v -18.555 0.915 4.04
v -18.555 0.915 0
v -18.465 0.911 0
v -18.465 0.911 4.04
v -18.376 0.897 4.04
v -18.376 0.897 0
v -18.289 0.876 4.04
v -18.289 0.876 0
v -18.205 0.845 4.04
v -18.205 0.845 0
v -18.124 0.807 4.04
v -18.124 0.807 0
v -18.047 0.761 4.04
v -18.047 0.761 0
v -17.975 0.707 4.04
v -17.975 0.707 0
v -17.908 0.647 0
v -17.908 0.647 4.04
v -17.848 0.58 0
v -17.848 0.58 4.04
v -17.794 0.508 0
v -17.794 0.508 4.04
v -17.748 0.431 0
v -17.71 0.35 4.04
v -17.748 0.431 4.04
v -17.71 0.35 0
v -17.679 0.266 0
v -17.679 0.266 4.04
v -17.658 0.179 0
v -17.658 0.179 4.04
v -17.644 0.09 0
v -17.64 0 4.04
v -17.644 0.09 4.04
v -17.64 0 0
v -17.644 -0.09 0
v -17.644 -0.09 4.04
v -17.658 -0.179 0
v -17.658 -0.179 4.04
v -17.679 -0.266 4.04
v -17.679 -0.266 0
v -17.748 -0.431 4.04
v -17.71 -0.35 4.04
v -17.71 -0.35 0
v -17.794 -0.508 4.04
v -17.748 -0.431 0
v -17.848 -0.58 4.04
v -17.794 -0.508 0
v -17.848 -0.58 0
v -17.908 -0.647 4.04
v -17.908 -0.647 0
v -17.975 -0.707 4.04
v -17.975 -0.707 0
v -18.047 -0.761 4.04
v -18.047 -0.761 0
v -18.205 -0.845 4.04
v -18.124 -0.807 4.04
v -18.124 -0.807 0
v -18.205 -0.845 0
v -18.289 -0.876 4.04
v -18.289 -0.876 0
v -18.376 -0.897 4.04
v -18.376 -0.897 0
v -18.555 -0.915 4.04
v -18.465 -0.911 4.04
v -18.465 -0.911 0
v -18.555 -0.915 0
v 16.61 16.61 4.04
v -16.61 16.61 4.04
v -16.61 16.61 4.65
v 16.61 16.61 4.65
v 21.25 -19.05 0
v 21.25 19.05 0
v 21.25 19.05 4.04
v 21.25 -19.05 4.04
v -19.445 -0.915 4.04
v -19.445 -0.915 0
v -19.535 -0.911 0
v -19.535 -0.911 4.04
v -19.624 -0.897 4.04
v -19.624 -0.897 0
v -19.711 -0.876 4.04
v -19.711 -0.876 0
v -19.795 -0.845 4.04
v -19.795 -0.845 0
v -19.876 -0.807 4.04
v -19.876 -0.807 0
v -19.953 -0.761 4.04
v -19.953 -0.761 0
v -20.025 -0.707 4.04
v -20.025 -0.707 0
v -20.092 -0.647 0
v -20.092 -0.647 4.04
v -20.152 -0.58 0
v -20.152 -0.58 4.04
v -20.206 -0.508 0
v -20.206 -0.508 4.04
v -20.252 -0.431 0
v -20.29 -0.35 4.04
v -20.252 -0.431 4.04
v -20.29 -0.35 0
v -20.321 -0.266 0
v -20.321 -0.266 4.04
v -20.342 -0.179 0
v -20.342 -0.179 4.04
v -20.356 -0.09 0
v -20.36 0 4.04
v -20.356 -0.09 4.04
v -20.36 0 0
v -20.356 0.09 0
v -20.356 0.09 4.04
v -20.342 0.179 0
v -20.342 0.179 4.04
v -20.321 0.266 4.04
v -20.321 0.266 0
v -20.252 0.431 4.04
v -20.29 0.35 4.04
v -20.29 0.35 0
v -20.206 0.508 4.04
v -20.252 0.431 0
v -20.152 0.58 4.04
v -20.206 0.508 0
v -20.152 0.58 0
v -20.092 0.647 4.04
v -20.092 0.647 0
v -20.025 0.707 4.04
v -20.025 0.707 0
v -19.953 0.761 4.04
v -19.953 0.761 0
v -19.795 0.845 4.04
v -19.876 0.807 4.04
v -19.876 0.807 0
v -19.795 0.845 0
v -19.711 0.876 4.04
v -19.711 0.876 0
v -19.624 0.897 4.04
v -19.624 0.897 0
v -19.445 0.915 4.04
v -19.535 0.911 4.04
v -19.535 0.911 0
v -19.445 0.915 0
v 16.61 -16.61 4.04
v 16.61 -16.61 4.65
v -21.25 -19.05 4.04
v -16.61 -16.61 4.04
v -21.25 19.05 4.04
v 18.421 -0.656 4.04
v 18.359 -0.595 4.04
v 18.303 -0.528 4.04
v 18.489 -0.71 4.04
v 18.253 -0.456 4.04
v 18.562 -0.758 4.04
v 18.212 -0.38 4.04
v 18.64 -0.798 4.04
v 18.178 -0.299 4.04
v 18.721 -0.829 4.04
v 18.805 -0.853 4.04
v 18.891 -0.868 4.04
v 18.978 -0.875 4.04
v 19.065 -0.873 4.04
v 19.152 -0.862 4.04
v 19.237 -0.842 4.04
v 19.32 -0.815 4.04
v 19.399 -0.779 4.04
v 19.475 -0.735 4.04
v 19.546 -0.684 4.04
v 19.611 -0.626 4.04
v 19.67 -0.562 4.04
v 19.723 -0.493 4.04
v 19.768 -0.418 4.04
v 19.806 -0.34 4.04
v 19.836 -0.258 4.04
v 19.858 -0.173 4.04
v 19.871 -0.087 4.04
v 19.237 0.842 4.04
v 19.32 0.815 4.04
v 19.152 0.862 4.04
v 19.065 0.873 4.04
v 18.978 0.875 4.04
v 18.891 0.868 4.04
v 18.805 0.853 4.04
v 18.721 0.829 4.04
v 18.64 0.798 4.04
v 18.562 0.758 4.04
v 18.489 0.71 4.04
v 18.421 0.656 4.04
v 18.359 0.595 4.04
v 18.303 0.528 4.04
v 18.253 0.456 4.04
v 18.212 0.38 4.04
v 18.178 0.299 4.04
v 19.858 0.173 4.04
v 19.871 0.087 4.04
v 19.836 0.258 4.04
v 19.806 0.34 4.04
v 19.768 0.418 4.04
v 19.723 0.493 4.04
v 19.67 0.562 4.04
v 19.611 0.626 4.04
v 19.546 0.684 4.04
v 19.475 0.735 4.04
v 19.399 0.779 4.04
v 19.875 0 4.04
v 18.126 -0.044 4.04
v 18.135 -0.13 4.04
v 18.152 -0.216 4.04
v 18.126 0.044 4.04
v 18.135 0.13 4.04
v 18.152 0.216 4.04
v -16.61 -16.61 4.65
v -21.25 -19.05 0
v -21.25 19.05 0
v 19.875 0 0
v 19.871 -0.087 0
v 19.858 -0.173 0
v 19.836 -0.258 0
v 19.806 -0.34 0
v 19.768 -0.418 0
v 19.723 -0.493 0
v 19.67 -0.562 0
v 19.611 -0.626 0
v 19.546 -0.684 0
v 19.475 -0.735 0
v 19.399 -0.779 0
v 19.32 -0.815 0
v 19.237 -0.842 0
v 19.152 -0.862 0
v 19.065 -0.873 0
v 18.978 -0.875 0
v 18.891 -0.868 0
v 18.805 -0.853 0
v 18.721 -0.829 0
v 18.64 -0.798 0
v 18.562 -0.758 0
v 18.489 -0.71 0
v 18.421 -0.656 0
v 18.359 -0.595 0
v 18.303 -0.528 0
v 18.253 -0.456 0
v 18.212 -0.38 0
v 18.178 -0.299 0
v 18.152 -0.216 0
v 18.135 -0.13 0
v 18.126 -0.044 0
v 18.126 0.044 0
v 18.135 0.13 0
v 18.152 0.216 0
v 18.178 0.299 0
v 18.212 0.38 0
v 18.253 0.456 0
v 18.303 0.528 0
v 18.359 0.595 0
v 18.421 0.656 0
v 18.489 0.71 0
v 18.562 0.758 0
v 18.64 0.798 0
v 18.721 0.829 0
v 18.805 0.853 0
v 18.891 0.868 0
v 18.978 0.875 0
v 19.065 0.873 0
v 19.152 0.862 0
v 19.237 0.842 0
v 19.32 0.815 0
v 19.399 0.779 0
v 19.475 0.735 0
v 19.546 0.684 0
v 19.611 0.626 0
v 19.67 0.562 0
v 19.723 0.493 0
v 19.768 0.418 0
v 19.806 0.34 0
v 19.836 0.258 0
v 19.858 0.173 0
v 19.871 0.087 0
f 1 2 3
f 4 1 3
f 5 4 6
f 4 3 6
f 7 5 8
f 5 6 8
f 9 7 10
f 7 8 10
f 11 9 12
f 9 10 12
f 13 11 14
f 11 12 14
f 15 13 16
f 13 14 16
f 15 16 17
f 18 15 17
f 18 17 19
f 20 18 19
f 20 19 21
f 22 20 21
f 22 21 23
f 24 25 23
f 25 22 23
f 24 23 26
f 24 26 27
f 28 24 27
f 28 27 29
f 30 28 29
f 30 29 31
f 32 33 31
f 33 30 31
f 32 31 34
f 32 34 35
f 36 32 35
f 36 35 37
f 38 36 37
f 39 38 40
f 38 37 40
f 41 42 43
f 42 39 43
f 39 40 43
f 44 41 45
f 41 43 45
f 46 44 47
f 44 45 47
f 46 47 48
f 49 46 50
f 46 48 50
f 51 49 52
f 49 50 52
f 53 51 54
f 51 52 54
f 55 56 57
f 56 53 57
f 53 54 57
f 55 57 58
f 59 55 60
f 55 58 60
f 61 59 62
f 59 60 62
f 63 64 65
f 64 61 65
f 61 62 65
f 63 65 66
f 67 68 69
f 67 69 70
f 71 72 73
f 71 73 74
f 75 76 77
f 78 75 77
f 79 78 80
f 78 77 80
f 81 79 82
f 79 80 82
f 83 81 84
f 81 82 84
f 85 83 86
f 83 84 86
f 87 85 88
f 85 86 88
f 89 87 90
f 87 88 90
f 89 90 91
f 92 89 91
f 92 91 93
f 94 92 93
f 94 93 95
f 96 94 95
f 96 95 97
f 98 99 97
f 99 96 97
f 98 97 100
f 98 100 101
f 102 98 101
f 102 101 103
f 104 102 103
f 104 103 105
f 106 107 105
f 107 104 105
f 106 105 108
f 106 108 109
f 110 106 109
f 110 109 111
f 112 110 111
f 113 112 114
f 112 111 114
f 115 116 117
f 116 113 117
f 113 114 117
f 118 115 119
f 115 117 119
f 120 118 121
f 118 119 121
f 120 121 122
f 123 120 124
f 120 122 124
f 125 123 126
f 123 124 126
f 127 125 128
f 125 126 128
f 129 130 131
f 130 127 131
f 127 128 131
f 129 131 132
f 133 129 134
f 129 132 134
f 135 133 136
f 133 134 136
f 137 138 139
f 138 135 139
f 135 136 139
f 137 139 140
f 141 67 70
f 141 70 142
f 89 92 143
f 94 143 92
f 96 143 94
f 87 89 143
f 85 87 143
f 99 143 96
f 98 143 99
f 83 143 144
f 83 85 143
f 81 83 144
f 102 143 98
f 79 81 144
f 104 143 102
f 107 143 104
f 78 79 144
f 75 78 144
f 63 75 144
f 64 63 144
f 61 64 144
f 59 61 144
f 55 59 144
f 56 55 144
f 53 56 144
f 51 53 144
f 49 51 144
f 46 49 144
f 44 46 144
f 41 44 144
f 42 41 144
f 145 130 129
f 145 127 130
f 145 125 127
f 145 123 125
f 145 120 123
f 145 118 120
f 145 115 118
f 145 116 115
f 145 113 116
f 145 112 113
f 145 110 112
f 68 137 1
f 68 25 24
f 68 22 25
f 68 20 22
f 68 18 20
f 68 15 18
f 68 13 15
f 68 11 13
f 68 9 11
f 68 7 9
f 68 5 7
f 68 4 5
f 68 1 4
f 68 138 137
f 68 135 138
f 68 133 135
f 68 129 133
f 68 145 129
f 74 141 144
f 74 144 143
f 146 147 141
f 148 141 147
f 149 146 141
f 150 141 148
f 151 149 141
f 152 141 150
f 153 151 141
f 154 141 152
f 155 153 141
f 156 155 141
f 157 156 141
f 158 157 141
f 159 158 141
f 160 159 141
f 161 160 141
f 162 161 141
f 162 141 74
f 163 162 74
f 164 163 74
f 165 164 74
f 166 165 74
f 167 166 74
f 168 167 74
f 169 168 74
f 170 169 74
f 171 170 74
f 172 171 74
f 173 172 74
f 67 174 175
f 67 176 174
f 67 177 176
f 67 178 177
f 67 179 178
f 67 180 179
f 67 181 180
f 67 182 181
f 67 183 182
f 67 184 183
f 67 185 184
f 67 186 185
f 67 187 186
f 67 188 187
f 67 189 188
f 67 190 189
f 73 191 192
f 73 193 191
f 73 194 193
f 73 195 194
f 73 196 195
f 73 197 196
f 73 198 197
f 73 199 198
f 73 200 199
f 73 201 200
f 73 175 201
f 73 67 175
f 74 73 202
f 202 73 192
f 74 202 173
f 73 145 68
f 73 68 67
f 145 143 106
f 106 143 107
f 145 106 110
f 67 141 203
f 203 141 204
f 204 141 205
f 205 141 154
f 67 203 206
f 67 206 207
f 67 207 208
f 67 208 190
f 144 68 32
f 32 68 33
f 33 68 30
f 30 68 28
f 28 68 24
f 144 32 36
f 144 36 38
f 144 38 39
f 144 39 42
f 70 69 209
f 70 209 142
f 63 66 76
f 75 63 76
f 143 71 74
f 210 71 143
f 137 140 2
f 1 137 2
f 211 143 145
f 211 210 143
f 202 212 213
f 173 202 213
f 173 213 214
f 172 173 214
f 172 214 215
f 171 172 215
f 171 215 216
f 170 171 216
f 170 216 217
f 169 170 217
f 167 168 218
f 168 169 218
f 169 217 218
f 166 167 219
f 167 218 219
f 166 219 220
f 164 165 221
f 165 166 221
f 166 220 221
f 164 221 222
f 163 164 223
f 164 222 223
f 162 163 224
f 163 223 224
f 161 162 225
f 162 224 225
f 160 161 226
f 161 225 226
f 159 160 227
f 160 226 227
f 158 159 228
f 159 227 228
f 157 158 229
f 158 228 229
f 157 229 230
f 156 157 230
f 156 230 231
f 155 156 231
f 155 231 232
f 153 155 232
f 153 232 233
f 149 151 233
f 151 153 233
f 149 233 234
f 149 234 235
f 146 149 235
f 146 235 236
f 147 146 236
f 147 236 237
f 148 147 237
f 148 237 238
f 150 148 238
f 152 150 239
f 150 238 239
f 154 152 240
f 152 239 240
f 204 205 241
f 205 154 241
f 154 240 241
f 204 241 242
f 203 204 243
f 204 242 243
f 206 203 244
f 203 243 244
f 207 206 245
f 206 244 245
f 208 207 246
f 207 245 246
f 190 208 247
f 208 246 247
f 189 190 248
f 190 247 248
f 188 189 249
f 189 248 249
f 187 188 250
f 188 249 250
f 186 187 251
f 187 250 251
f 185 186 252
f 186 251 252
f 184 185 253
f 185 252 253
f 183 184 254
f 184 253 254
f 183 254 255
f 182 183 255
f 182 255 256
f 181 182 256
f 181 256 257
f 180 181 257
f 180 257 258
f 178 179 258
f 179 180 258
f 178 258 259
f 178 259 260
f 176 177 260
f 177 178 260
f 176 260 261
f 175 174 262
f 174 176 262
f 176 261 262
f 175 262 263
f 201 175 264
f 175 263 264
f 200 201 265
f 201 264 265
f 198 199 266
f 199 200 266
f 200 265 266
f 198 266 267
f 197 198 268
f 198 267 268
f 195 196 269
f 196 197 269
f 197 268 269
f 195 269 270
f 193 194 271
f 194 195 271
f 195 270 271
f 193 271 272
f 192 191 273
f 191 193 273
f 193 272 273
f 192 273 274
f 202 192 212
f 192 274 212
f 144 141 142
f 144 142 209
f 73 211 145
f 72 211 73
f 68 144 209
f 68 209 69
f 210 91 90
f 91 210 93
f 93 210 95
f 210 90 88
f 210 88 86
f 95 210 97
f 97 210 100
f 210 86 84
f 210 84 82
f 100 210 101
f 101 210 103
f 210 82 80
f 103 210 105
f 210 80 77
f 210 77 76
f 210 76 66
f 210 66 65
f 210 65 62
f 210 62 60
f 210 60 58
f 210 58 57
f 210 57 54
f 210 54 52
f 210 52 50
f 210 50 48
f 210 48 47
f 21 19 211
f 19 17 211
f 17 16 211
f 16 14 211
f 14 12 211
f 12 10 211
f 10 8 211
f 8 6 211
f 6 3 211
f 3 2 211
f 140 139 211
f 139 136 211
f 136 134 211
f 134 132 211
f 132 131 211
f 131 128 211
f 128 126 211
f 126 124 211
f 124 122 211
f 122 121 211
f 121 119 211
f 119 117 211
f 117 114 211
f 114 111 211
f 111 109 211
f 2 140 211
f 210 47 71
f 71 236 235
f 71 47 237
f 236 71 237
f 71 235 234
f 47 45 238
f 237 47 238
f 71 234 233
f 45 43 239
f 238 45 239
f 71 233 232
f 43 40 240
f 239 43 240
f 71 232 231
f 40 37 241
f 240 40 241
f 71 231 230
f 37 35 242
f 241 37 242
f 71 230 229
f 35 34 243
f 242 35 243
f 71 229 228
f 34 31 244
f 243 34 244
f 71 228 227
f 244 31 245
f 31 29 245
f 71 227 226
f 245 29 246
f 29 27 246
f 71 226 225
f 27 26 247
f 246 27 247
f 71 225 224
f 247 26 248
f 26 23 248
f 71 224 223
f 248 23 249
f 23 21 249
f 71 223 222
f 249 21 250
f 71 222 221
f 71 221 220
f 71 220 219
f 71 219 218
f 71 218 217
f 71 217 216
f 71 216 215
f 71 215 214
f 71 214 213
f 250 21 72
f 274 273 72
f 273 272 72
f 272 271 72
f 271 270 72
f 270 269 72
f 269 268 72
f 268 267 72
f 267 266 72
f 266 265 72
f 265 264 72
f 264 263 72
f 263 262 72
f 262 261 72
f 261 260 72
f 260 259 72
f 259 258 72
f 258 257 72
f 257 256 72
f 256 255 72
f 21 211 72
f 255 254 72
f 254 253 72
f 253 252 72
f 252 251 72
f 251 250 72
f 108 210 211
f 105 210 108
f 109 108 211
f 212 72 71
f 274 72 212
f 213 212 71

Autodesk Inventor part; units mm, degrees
ref_plane "YZ Plane" through (0, 0, 0) normal (1, 0, 0) x (0, 1, 0)
ref_plane "XZ Plane" through (0, 0, 0) normal (0, 1, 0) x (-1, 0, 0)
ref_plane "XY Plane" through (0, 0, 0) normal (0, 0, 1) x (1, 0, 0)
sketch "Sketch1" plane through (0, 0, 0) normal (0, 0, 1) x (1, 0, 0)
  line L0 (-21.25, 19.05) -> (21.25, 19.05)
  line L1 (21.25, 19.05) -> (21.25, -19.05)
  line L2 (21.25, -19.05) -> (-21.25, -19.05)
  line L3 (-21.25, -19.05) -> (-21.25, 19.05)
  line L4 (21.25, 0) -> (-21.25, 0) construction
  circle A0 centre (19, 0) radius 0.875
  line L5 (-19.445, 0.915) -> (-18.555, 0.915)
  line L6 (-18.555, -0.915) -> (-19.445, -0.915)
  arc A1 (-19.445, 0.915) -> (-19.445, -0.915) centre (-19.445, 0) ccw
  arc A2 (-18.555, -0.915) -> (-18.555, 0.915) centre (-18.555, 0) ccw
  line L7 (0, -19.05) -> (0, 19.05) construction
  line L8 (-19, 0.915) -> (-19, -0.915) construction
  point P0 (0, 0)
  point P1 (-19, 0)
  dimension "d0" = 38.1
  dimension "d2" = 42.5
  dimension "d3" = 2.25
  dimension "d4" = 1.75
  dimension "d6" = 1.83
  dimension "d7" = 2.72
  dimension "d8" = 38
extrude "Extrusion1" add sketch "Sketch1" along normal blind 4.04
sketch "Sketch2" plane through (0, 0, 4.04) normal (0, 0, 1) x (1, 0, 0)
  line L0 (-16.61, 16.61) -> (16.61, 16.61)
  line L1 (16.61, 16.61) -> (16.61, -16.61)
  line L2 (16.61, -16.61) -> (-16.61, -16.61)
  line L3 (-16.61, -16.61) -> (-16.61, 16.61)
  line L4 (0, 16.61) -> (0, -16.61) construction
  line L5 (-16.61, 0) -> (16.61, 0) construction
  point P0 (0, 0)
  dimension "d11" = 33.22
  dimension "d18" = 33.22
extrude "Extrusion2" add sketch "Sketch2" along normal blind 0.61
sketch "Sketch3" plane through (0, 0, 4.65) normal (0, 0, 1) x (1, 0, 0)
  line L0 (16.61, 16.61) -> (-16.61, 16.61) projected
  line L1 (-16.61, 16.61) -> (-16.61, -16.61) projected
  line L2 (-16.61, -16.61) -> (16.61, -16.61) projected
  line L3 (16.61, -16.61) -> (16.61, 16.61) projected
  line L4 (-9.5505, 7.125) -> (9.5505, 7.125)
  line L5 (9.5505, 7.125) -> (9.5505, -7.125)
  line L6 (9.5505, -7.125) -> (-9.5505, -7.125)
  line L7 (-9.5505, -7.125) -> (-9.5505, 7.125)
  line L8 (-9.5505, 7.125) -> (9.5505, -7.125) construction
  line L9 (9.5505, 7.125) -> (-9.5505, -7.125) construction
  point P0 (0, 0)
  point P1 (0, 0)
  dimension "d21" = 19.101
  dimension "d23" = 14.25
properties part number "KAC12040"
